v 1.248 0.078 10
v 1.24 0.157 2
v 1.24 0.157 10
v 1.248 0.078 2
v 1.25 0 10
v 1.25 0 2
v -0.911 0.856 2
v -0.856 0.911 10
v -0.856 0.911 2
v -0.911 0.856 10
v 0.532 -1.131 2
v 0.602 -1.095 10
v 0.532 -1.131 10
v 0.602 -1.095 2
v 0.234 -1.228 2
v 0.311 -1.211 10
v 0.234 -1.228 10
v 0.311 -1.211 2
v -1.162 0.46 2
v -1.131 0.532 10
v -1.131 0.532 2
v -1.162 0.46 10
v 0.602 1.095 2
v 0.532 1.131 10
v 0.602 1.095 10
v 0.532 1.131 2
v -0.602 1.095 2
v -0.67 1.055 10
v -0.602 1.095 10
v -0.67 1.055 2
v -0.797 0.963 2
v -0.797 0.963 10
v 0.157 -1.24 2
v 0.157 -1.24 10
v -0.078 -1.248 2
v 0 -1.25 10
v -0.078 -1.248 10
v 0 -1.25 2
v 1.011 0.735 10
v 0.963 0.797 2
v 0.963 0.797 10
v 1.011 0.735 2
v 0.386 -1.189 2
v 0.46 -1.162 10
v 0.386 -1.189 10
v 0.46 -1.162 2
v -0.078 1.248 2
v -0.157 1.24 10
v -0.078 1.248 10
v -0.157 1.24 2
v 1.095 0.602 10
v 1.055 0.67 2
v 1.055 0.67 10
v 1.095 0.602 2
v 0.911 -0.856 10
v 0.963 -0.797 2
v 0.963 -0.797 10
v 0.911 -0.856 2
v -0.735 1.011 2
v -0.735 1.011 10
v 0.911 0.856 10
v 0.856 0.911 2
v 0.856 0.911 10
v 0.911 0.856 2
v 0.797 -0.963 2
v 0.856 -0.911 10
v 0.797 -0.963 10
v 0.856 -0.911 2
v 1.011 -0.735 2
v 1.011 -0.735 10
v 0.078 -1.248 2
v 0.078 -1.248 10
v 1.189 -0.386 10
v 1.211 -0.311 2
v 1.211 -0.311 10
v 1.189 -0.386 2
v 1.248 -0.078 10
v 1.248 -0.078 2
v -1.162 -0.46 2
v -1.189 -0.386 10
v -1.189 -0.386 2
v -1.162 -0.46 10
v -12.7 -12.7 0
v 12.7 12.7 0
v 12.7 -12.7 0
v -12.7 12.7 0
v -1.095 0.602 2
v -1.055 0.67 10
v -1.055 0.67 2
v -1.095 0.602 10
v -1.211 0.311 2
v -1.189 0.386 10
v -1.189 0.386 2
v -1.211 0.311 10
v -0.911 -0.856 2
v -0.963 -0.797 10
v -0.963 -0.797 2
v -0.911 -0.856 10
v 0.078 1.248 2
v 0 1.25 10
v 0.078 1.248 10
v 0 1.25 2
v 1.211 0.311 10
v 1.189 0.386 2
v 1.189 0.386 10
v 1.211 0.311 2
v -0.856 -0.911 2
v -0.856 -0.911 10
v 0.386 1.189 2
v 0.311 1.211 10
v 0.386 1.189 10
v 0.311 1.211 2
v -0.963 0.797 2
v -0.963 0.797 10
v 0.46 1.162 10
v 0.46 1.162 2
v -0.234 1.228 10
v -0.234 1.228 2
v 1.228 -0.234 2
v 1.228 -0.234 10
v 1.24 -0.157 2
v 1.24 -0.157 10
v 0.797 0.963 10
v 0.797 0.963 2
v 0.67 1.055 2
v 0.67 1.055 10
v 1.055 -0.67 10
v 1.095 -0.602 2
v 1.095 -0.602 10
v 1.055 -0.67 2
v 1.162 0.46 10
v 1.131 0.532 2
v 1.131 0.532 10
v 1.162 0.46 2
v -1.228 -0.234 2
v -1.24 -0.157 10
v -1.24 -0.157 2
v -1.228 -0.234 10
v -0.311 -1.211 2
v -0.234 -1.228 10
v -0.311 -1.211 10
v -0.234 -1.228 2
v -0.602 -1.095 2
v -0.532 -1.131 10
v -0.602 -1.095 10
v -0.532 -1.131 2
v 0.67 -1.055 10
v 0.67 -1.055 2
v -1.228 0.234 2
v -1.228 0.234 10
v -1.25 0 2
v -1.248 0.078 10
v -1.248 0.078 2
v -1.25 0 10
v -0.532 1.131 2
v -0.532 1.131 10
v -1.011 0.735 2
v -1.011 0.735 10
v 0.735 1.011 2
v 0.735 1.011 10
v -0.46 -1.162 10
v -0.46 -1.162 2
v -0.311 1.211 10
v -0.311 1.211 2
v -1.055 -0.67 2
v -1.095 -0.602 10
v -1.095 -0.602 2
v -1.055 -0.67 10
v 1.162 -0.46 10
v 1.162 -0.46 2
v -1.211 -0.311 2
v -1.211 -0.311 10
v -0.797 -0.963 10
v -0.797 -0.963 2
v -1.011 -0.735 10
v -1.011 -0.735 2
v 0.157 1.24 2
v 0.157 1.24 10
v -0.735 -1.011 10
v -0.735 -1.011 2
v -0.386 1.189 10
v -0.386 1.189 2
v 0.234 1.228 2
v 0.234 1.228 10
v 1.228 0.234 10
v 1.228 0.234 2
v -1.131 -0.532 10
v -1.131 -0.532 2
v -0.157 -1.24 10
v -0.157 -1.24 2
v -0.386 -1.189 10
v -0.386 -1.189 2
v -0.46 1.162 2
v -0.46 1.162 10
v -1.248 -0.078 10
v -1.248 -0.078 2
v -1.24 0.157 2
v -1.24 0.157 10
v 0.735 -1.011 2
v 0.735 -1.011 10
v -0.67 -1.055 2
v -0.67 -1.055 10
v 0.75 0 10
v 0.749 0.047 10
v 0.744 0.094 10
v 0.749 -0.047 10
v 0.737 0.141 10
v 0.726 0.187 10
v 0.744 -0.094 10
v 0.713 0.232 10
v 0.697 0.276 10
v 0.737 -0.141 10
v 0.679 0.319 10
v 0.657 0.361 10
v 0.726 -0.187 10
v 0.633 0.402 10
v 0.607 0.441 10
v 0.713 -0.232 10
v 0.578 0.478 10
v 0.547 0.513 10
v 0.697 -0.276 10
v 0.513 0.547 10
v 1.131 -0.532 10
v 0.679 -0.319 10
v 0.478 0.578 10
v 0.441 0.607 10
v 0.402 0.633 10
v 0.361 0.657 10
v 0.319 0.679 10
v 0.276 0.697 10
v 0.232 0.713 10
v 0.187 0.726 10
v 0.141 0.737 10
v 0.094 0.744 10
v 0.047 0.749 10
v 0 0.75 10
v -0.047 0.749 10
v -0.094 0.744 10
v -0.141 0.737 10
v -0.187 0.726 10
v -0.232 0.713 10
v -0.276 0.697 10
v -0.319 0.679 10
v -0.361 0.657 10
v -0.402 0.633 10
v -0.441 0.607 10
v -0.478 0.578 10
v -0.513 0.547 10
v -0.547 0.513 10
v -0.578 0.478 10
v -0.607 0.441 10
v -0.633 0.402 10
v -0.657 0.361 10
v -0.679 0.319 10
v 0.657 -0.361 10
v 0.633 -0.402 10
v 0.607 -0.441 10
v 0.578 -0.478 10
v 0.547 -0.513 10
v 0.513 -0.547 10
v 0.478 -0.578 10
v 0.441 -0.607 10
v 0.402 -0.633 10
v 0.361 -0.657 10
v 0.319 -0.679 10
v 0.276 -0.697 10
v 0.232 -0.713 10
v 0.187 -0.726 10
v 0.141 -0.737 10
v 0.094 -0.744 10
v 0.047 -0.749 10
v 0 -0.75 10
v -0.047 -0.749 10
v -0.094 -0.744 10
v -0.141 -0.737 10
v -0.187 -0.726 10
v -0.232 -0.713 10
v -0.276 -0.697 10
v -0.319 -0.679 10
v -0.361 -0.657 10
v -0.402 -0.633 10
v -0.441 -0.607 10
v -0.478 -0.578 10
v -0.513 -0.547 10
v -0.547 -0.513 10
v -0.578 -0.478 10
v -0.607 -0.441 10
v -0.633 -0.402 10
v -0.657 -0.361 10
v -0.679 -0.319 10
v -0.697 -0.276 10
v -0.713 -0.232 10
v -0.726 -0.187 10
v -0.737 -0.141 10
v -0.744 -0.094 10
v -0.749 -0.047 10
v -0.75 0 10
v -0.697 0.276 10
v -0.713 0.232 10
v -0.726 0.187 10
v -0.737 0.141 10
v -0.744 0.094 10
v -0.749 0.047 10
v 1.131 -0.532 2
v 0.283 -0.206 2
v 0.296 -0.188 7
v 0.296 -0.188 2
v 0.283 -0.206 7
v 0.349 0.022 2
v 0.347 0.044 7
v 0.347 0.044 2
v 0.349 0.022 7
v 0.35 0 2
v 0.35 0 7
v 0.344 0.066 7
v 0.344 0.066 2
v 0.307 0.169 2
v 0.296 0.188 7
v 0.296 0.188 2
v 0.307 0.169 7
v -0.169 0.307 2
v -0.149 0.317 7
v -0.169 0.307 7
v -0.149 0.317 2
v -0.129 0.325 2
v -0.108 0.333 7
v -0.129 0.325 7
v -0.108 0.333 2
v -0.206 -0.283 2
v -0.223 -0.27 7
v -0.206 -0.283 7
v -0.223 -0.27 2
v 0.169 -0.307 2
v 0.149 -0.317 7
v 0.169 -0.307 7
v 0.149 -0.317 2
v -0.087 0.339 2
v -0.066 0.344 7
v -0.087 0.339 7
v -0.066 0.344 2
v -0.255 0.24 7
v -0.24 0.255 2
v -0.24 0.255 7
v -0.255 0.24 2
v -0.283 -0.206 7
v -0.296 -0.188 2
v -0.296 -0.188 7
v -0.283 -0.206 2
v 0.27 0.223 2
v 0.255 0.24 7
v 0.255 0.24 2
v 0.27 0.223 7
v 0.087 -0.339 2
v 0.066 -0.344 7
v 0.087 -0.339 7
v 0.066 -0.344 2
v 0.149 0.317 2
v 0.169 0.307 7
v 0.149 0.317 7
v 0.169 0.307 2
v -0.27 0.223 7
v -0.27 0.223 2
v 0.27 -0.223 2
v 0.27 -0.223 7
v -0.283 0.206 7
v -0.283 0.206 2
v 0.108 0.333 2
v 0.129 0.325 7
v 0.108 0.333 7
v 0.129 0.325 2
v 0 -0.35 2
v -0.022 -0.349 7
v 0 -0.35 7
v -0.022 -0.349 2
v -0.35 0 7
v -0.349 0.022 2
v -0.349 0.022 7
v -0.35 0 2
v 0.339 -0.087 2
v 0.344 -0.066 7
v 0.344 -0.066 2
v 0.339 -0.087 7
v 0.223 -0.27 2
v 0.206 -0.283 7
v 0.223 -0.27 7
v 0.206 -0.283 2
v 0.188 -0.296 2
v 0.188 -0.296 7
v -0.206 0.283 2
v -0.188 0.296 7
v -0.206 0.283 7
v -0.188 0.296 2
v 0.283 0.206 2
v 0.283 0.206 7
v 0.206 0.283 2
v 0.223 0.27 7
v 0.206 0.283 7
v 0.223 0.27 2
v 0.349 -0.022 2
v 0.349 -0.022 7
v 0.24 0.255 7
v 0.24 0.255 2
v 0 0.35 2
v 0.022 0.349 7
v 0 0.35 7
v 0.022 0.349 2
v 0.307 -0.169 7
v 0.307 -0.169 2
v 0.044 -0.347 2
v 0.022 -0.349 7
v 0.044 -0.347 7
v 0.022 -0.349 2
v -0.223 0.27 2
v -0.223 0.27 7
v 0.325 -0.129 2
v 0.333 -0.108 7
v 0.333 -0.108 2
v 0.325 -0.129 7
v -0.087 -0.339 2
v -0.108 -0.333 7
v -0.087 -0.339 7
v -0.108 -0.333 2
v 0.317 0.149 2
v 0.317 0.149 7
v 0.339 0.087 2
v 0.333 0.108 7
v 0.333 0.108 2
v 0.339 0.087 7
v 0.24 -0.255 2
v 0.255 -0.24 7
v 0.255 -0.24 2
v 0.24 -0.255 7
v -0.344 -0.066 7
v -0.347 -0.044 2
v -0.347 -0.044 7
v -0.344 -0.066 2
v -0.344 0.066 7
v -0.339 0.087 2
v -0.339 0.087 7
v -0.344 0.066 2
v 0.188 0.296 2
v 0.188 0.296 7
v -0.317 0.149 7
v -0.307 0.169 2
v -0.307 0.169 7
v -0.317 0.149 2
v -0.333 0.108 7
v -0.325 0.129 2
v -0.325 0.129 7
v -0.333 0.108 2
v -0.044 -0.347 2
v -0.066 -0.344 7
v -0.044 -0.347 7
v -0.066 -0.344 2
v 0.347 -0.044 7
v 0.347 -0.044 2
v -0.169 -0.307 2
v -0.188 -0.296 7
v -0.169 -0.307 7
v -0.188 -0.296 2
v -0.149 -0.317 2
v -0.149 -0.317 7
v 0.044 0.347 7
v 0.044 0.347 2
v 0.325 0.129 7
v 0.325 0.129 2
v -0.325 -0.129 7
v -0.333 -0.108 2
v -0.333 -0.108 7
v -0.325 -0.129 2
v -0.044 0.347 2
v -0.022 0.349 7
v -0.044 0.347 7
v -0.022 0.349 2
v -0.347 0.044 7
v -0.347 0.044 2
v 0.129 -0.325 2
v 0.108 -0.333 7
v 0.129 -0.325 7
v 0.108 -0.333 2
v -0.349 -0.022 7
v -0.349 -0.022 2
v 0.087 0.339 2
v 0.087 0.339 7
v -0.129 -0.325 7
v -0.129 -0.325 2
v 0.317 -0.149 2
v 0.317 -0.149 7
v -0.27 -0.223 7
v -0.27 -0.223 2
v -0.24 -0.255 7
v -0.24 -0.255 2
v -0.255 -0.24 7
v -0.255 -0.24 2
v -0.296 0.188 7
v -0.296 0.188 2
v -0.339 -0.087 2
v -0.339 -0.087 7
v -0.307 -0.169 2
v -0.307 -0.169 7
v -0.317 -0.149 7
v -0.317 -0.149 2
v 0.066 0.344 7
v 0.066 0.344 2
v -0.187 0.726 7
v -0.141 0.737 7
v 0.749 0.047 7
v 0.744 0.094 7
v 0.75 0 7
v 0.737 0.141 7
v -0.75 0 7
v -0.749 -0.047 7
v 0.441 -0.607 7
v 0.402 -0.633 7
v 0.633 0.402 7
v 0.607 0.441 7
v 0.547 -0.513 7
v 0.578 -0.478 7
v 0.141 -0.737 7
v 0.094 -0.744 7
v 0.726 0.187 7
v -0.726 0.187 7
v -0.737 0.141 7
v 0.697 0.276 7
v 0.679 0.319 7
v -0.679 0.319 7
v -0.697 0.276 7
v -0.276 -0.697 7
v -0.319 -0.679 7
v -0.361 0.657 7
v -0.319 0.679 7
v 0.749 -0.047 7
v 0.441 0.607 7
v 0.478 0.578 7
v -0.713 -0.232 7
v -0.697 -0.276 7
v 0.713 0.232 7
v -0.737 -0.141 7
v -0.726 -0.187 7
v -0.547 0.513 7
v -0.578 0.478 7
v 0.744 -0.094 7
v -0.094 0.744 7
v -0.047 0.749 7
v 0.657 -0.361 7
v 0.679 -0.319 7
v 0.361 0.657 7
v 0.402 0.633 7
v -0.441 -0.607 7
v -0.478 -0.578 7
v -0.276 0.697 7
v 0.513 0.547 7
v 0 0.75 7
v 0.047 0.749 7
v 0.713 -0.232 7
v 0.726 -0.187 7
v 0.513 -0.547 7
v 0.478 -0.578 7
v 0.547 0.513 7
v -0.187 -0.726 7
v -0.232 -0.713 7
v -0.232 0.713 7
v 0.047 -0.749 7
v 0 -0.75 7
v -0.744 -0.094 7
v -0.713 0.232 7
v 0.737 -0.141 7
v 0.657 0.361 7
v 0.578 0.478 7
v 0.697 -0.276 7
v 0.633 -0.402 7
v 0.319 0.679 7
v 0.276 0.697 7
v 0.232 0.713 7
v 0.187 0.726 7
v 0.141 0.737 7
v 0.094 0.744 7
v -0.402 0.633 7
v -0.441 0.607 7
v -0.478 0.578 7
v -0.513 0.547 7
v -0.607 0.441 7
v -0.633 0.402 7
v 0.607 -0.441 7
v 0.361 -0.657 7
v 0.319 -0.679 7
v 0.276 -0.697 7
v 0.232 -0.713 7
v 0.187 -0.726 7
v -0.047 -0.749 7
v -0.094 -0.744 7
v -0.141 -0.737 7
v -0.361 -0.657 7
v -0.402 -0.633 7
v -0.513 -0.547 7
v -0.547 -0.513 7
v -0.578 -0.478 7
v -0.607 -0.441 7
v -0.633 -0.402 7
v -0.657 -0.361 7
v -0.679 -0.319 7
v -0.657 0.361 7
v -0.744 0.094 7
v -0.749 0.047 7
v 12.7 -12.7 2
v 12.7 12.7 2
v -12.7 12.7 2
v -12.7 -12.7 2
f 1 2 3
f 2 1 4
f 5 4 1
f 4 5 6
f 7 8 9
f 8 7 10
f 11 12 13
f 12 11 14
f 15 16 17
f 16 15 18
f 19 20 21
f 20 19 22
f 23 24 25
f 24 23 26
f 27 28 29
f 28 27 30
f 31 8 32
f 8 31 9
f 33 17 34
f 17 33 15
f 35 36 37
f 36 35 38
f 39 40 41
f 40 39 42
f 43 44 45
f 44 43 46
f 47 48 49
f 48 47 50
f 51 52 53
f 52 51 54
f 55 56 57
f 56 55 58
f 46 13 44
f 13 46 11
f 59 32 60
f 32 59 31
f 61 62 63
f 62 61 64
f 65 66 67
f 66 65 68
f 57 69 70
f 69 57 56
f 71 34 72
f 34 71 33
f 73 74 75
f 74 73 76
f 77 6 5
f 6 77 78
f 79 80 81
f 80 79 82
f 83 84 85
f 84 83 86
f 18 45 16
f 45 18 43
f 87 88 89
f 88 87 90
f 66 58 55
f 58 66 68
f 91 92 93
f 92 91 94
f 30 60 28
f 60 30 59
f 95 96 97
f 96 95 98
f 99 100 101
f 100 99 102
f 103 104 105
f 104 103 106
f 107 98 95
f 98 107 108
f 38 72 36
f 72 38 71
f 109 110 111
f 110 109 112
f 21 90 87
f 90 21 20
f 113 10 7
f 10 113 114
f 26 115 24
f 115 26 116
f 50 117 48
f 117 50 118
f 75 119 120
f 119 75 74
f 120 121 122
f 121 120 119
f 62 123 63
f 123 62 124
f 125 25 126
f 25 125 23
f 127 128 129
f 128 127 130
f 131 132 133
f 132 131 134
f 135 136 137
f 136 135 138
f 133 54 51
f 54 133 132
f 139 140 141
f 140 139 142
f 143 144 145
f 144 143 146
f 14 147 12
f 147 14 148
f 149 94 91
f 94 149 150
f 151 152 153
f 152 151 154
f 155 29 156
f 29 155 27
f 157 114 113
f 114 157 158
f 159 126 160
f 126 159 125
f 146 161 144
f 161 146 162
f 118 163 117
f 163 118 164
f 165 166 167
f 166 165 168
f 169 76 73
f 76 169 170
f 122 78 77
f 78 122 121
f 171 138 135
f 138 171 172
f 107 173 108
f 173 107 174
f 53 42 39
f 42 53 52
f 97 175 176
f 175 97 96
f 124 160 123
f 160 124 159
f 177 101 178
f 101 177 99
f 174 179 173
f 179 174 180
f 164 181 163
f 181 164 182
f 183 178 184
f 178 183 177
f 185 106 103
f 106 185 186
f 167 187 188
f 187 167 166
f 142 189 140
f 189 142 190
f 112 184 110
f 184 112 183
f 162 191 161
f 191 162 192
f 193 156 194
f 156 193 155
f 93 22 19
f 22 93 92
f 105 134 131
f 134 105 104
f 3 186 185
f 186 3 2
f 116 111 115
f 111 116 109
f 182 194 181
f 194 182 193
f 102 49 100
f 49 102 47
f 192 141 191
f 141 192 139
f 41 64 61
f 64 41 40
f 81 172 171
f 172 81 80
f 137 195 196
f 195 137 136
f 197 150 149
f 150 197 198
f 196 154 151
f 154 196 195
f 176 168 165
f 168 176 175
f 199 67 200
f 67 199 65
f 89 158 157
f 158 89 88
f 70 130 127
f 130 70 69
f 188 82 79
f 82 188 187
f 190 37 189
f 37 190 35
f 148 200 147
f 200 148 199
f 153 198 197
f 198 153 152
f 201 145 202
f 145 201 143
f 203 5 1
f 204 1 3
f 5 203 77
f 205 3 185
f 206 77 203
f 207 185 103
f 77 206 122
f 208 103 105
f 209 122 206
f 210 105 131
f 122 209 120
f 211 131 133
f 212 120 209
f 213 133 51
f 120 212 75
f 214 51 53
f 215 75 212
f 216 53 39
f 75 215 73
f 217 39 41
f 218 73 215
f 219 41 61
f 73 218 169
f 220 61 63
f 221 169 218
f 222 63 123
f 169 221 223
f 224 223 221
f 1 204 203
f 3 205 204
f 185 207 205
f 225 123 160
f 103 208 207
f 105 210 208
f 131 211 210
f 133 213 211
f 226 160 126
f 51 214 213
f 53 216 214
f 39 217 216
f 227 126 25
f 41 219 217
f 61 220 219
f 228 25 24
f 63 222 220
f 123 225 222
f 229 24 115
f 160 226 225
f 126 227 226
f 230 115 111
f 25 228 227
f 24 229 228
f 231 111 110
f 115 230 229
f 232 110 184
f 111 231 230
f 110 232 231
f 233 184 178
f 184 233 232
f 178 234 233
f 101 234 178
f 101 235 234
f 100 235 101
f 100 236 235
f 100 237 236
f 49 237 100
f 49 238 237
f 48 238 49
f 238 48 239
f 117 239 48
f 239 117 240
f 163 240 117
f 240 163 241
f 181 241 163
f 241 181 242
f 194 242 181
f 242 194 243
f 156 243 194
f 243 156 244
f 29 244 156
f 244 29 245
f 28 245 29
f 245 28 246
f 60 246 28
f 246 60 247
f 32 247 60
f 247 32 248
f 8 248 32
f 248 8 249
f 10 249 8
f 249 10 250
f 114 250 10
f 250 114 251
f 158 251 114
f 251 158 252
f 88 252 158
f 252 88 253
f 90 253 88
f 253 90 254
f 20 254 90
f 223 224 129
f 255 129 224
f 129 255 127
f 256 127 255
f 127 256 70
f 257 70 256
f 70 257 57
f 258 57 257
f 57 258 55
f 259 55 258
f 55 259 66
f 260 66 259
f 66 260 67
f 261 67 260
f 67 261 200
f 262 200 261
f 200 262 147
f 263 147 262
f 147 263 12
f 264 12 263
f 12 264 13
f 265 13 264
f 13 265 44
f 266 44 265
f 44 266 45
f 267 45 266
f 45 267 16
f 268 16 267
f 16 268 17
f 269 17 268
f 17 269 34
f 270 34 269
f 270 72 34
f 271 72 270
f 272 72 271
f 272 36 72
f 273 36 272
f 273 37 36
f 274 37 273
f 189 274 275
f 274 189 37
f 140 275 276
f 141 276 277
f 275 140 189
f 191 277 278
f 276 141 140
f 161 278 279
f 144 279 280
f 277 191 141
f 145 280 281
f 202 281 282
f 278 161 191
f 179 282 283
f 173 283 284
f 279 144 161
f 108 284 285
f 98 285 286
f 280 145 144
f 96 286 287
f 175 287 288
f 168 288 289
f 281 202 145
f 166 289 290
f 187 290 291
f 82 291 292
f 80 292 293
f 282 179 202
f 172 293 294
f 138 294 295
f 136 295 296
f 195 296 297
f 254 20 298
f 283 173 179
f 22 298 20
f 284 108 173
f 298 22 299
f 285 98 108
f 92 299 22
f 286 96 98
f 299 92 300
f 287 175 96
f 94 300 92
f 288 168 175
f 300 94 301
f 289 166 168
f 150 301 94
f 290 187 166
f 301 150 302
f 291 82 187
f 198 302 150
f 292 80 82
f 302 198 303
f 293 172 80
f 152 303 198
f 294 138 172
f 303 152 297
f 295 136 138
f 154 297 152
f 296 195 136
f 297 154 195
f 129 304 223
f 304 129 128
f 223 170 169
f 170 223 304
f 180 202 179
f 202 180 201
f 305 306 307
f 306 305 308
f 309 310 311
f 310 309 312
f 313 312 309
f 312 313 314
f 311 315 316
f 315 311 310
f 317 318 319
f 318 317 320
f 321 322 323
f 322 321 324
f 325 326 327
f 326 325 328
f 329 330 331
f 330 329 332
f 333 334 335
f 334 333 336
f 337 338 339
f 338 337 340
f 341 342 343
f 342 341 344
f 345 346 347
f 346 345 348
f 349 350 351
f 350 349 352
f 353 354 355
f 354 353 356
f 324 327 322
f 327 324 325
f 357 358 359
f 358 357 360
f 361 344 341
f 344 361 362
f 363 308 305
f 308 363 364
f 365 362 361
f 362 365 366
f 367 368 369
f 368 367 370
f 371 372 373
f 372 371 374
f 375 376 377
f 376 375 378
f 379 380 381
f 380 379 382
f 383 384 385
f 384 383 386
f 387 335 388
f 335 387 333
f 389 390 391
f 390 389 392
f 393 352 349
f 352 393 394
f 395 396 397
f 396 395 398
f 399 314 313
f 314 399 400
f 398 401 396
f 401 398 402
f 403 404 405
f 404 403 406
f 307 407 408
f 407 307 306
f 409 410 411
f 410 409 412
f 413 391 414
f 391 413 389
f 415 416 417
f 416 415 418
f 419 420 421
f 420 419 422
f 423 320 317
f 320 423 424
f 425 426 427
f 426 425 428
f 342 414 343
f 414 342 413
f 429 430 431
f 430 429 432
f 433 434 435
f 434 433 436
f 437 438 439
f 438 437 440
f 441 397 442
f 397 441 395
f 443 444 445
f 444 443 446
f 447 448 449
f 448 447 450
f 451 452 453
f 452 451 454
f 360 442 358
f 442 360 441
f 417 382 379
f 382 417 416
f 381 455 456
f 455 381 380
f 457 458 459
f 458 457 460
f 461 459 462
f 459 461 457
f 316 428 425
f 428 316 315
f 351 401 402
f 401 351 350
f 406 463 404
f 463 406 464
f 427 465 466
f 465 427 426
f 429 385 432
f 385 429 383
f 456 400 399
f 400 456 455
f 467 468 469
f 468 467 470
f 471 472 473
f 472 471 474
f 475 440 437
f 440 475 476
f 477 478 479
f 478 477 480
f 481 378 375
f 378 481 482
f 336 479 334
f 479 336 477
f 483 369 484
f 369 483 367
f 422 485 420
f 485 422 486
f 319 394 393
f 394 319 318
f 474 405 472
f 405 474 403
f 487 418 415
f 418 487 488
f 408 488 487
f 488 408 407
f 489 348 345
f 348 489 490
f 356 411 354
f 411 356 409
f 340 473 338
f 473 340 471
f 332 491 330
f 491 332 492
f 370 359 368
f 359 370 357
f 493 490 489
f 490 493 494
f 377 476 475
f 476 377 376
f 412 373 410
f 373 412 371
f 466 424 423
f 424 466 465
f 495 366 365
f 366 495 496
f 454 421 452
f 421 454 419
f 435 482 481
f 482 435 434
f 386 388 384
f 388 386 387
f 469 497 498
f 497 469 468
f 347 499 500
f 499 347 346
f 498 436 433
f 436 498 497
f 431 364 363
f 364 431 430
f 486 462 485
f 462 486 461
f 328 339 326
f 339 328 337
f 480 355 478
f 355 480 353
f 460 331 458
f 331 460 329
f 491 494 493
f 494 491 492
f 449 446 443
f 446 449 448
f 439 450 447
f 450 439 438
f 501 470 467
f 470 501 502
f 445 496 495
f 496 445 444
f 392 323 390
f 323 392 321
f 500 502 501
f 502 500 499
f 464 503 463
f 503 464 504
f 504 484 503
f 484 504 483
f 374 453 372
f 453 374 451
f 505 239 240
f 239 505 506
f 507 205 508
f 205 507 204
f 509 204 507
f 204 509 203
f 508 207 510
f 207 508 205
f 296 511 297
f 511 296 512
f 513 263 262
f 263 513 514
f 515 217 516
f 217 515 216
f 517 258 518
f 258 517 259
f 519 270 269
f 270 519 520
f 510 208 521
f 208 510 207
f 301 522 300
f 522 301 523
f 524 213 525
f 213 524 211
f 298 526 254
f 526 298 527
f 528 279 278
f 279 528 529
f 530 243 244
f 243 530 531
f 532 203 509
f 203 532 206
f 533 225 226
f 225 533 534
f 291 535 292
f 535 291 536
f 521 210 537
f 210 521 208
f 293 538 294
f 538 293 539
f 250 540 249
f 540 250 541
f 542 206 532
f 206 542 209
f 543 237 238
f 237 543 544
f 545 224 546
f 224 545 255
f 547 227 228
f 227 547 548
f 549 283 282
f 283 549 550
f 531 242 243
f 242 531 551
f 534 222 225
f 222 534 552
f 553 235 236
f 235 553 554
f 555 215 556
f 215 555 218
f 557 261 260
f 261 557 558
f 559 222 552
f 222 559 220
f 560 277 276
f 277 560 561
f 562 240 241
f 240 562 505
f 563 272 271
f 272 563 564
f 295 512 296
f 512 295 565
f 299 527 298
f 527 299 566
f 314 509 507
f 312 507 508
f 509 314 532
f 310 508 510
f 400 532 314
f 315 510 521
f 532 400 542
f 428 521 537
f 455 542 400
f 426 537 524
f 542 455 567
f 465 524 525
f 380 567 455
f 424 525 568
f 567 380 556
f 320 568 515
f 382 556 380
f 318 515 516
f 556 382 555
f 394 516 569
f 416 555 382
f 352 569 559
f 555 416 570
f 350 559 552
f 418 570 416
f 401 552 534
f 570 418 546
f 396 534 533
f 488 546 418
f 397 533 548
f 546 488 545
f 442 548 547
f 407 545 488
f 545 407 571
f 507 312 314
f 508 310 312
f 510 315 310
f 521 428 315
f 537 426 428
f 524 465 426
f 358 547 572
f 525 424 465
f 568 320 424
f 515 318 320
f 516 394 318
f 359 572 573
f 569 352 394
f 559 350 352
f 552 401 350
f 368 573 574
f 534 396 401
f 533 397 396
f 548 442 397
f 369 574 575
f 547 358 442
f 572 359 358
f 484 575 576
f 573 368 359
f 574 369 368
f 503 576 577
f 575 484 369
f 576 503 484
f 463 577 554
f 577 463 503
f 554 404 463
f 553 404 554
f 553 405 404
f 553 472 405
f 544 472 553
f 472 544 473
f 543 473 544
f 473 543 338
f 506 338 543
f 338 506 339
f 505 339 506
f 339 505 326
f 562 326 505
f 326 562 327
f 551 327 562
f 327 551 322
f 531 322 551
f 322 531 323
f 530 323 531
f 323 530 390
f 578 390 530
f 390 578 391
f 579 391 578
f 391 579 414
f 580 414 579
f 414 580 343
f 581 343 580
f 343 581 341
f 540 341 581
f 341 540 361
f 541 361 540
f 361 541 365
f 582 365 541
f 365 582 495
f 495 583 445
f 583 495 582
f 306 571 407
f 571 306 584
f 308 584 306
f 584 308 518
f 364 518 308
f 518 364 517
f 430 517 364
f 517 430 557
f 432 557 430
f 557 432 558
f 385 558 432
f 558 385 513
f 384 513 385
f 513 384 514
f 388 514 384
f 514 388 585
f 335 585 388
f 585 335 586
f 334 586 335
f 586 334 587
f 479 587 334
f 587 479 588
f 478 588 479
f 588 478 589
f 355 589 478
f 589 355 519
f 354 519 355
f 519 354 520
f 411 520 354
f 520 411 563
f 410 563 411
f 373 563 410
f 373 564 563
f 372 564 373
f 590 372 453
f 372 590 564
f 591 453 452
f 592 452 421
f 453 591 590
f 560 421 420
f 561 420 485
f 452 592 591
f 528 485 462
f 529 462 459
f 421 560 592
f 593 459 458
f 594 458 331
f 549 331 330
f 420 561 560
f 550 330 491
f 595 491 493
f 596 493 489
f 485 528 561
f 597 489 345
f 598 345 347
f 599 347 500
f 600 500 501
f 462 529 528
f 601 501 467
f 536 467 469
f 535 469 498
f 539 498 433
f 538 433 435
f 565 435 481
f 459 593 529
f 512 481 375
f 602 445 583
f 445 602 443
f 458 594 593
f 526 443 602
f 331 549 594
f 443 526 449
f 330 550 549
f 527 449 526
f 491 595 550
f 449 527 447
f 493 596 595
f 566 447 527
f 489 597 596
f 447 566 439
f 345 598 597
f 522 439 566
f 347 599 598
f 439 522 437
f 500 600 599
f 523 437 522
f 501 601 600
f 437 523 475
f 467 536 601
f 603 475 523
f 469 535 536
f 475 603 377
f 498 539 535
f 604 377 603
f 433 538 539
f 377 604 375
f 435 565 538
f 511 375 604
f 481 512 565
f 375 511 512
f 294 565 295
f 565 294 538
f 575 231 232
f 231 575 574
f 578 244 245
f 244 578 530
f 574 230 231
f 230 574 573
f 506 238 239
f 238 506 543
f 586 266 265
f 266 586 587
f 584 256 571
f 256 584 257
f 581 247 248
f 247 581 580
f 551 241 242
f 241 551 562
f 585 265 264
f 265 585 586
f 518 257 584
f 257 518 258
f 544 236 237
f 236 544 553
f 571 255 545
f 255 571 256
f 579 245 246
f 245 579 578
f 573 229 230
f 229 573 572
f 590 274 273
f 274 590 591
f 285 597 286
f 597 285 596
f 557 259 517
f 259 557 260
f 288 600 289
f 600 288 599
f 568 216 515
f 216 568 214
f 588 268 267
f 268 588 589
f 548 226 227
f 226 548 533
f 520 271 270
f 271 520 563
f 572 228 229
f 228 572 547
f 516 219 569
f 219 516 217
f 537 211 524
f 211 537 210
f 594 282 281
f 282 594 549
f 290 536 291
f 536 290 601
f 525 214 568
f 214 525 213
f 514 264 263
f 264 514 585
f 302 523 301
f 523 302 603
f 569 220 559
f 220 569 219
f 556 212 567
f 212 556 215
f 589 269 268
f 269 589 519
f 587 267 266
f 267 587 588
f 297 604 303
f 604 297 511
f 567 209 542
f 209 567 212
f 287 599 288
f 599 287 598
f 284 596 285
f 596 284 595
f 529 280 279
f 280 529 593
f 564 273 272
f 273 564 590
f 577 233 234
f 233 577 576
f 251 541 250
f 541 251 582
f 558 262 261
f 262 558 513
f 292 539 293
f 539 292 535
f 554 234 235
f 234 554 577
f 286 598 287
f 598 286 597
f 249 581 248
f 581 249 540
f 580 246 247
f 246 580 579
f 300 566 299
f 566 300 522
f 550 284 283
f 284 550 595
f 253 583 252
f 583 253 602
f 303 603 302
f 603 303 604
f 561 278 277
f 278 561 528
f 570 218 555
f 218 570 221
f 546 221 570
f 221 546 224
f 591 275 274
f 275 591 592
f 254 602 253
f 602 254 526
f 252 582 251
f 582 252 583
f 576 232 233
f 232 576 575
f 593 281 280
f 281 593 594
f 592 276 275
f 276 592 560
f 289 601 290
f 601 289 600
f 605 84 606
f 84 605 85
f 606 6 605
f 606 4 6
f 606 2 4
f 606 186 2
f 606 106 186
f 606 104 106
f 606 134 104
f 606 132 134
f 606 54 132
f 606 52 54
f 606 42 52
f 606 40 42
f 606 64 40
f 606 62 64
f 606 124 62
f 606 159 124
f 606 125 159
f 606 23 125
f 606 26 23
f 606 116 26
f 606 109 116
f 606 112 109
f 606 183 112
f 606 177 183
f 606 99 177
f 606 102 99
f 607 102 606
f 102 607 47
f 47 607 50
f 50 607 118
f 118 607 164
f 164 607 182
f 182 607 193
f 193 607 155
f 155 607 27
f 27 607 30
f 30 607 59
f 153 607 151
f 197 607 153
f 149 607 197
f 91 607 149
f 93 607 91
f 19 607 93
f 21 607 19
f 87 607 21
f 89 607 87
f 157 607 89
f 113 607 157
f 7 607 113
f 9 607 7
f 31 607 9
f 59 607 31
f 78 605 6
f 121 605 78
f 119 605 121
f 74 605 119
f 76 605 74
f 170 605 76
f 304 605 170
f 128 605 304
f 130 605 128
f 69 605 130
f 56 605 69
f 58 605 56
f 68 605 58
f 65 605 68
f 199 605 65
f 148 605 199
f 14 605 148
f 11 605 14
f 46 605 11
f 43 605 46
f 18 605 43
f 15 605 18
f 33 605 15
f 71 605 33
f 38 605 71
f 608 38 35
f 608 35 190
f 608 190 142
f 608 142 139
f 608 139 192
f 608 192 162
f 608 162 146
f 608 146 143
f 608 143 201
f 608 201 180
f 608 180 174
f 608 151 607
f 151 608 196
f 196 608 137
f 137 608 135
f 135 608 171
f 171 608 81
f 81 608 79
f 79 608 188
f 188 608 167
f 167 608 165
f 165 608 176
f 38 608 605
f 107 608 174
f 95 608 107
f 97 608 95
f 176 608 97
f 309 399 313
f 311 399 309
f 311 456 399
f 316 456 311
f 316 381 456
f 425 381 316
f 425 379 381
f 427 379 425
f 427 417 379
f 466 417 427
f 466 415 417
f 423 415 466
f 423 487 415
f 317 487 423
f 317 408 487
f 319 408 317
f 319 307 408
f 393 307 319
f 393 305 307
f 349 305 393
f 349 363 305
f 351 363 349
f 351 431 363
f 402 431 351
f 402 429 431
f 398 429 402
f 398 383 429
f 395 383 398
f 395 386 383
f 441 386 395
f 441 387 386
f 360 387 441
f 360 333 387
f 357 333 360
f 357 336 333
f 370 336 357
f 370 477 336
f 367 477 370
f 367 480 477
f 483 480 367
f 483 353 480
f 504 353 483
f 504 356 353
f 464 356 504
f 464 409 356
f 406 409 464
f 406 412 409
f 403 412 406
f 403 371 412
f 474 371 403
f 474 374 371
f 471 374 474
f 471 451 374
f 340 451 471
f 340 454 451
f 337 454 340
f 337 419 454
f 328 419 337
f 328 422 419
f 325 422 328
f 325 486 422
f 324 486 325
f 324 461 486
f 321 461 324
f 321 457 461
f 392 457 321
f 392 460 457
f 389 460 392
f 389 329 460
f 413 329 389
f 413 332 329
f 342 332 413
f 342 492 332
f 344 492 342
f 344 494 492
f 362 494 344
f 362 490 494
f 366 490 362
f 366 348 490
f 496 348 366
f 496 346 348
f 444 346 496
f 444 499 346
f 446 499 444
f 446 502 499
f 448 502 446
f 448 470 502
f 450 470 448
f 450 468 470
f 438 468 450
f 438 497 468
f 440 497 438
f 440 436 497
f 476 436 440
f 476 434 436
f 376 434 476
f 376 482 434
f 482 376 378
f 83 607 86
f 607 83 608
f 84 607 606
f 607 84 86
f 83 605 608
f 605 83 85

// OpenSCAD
difference() {
    cylinder(h=10, d=2.5); // Main body
    cylinder(h=15, d=0.7, center = true); // Center hole
    translate([0, 0, 12]) cylinder(h=10, d=1.5, center = true); // Side boss
}
$fn = 100;
translate([0,0,1])
cube([25.4, 25.4,2], center = true);
